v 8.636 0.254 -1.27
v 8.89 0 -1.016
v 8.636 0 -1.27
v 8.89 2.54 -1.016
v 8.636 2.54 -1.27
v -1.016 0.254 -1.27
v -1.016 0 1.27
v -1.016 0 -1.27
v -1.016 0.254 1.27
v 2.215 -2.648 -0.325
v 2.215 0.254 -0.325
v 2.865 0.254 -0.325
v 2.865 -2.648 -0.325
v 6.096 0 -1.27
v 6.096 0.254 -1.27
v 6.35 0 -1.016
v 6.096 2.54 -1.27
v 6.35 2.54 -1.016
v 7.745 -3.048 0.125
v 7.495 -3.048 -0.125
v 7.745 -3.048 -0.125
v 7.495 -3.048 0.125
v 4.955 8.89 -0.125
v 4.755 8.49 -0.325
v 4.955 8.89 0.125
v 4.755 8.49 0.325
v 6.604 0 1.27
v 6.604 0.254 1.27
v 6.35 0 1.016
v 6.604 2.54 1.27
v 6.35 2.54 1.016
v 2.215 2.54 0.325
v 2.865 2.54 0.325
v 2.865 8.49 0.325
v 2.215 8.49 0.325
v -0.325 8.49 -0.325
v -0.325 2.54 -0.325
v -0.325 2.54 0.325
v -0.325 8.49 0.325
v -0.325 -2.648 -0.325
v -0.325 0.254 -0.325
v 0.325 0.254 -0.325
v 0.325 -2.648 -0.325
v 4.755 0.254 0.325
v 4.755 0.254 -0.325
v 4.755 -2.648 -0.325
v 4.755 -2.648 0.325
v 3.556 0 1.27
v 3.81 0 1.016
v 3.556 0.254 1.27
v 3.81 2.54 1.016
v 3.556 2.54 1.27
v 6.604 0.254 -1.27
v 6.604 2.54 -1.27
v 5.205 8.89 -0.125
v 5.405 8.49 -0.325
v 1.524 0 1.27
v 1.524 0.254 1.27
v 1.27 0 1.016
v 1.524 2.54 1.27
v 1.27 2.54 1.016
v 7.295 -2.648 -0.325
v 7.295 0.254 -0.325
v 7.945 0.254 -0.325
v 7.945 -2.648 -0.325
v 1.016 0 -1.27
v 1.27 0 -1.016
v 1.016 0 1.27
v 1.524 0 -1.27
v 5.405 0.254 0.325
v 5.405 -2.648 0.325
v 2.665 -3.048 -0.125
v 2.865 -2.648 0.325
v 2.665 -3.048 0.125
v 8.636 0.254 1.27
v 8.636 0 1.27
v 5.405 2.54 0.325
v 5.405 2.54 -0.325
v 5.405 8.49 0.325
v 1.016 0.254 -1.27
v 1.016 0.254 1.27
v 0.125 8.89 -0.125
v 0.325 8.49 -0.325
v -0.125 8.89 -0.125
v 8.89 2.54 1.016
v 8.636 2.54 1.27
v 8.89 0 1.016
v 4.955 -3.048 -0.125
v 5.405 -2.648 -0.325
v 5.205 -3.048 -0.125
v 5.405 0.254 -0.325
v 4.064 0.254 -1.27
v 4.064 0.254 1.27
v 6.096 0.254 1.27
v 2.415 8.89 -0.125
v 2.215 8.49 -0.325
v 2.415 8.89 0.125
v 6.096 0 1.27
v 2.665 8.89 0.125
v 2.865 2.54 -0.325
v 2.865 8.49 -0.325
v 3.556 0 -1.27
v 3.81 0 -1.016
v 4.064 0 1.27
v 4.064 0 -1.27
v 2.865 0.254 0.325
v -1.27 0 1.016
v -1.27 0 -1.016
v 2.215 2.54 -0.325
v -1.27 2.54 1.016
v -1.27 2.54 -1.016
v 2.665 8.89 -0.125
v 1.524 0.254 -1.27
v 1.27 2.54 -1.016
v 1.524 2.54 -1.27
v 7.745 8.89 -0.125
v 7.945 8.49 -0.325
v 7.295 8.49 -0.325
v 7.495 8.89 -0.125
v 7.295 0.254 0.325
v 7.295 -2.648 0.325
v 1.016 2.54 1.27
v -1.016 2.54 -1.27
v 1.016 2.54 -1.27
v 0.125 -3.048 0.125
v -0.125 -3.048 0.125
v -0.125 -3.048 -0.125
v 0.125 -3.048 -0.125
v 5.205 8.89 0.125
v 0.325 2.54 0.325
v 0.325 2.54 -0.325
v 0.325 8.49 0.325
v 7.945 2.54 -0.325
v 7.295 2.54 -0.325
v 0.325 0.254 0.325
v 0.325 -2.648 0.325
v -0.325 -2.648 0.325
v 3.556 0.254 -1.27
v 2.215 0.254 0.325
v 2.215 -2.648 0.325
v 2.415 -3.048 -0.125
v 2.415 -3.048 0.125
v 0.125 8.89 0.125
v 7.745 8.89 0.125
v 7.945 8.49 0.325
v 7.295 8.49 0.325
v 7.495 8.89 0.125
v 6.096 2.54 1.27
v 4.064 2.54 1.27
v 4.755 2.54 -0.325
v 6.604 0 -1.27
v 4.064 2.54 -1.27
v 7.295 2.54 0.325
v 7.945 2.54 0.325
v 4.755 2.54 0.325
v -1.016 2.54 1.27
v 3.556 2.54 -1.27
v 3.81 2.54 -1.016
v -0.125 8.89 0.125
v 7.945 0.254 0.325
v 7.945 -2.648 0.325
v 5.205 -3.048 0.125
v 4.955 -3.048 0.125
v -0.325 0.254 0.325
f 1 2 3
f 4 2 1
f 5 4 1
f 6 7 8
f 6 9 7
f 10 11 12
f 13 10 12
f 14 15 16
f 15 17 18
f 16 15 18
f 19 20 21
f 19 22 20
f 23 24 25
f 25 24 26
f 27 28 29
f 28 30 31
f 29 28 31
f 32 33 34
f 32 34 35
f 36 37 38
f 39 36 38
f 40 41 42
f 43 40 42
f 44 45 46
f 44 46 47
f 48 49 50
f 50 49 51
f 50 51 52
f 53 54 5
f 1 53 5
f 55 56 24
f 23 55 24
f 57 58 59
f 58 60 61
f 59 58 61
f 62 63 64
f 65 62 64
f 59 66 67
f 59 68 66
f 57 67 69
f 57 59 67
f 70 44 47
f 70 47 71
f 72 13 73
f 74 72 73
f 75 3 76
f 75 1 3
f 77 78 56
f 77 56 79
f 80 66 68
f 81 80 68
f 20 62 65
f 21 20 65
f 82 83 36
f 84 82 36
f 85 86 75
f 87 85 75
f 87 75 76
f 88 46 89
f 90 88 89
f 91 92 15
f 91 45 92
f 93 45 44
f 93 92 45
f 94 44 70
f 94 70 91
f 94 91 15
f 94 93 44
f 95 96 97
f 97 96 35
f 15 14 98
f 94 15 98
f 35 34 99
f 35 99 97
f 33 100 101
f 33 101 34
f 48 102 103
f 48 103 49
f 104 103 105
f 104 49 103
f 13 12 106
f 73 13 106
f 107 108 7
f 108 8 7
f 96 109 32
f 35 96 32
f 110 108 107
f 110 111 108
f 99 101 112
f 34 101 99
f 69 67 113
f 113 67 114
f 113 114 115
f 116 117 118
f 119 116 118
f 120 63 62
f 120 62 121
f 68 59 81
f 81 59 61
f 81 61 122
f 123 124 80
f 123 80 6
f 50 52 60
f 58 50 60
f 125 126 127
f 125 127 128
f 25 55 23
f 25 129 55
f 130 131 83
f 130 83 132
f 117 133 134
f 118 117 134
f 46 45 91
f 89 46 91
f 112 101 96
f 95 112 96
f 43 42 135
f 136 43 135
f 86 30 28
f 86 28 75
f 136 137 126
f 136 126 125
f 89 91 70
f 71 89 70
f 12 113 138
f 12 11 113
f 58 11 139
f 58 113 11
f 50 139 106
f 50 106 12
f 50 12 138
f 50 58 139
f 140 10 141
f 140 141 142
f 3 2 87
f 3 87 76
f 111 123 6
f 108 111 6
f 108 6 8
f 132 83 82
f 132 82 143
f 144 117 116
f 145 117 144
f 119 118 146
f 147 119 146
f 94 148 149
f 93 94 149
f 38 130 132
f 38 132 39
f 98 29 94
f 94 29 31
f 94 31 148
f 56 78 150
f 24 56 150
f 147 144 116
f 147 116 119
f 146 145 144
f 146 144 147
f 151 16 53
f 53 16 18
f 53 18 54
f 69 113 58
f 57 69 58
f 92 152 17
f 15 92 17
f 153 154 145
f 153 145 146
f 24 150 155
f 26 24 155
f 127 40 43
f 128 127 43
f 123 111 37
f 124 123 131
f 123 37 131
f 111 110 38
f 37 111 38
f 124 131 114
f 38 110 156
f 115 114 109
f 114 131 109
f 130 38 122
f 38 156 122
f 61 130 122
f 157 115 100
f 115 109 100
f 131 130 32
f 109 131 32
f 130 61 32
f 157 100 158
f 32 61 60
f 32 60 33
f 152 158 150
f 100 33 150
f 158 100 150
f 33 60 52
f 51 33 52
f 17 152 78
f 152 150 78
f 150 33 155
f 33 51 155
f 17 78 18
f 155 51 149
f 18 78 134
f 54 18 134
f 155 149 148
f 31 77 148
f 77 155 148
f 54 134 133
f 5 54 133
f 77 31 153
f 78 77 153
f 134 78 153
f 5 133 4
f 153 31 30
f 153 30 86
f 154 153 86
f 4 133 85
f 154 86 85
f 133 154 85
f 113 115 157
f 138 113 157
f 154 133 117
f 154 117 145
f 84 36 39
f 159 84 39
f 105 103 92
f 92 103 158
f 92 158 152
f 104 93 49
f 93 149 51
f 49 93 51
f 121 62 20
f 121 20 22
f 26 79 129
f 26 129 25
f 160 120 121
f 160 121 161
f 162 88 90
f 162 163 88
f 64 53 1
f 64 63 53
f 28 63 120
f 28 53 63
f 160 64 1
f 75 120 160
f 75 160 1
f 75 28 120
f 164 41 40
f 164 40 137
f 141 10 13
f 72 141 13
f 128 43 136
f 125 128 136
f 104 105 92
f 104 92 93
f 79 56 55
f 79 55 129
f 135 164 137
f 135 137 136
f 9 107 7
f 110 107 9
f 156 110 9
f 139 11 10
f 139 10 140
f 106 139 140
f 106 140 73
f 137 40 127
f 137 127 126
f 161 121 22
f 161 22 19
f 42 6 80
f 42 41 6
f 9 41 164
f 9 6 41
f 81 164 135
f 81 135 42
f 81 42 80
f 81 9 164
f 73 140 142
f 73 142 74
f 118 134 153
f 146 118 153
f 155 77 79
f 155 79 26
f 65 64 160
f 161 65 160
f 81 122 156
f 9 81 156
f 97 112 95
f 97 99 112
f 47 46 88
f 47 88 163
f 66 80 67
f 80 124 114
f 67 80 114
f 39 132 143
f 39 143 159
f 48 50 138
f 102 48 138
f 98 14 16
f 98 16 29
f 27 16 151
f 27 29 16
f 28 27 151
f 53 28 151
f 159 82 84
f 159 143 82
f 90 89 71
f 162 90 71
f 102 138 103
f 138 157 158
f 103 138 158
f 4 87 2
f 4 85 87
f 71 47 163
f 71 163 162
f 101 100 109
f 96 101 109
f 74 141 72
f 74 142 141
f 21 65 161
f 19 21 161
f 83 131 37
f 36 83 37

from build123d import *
from OCP.BRepFilletAPI import BRepFilletAPI_MakeChamfer

# Parameters (mm, degrees)
CUT_EXTRUDE1_START   = -2.54
CUT_EXTRUDE1_DEPTH   = 2.286
CUT_EXTRUDE1_START_2 = -0.254
CUT_EXTRUDE1_2_DEPTH = 0.254
SKETCH2_W            = 2.032
SKETCH2_H            = 2.54
CUT_EXTRUDE2_DEPTH   = 0.254
CUT_EXTRUDE3_DEPTH   = 0.254
CUT_EXTRUDE4_DEPTH   = 0.254
BOSS_EXTRUDE1_DEPTH  = 0.254
BOSS_EXTRUDE2_DEPTH  = 0.254
SKETCH7_W            = 0.65
SKETCH7_H            = 0.65
BOSS_EXTRUDE3_DEPTH  = 3.302
SKETCH8_W            = 0.65
SKETCH8_H            = 0.65
BOSS_EXTRUDE4_DEPTH  = 3.302
SKETCH9_W            = 0.65
SKETCH9_H            = 0.65
BOSS_EXTRUDE5_DEPTH  = 3.302
SKETCH10_W           = 0.65
SKETCH10_H           = 0.65
BOSS_EXTRUDE6_DEPTH  = 3.302
SKETCH11_W           = 0.65
SKETCH11_H           = 0.65
BOSS_EXTRUDE7_DEPTH  = 6.35
SKETCH12_W           = 0.65
SKETCH12_H           = 0.65
BOSS_EXTRUDE8_DEPTH  = 6.35
SKETCH13_W           = 0.65
SKETCH13_H           = 0.65
BOSS_EXTRUDE9_DEPTH  = 6.35
SKETCH14_W           = 0.65
SKETCH14_H           = 0.65
BOSS_EXTRUDE10_DEPTH = 6.35
CHAMFER1_SIZE        = 0.254
CHAMFER2_SIZE        = 0.2
CHAMFER2_SIZE2       = 0.4


with BuildPart() as part:
    # Cut-Extrude1: read off the stored shape, not the designer's step
    # Cut-Extrude1 outline → Cut-Extrude1 (new body)
    with BuildSketch(Plane.XZ.offset(CUT_EXTRUDE1_START)):
        Polygon((3.556, 1.27), (1.524, 1.27), (1.27, 1.016), (1.016, 1.27), (-1.016, 1.27), (-1.27, 1.016), (-1.27, -1.27), (1.016, -1.27), (1.27, -1.016), (1.524, -1.27), (3.556, -1.27), (3.81, -1.016), (4.064, -1.27), (6.096, -1.27), (6.35, -1.016), (6.604, -1.27), (8.636, -1.27), (8.89, -1.016), (8.89, 1.27), (6.604, 1.27), (6.35, 1.016), (6.096, 1.27), (4.064, 1.27), (3.81, 1.016), align=None)
    extrude(amount=CUT_EXTRUDE1_DEPTH)

    # Cut-Extrude1 2 outline → Cut-Extrude1 2 (add)
    with BuildSketch(Plane.XZ.offset(CUT_EXTRUDE1_START_2)):
        Polygon((1.27, -1.016), (1.524, -1.27), (1.524, 1.27), (1.27, 1.016), (1.016, 1.27), (-1.016, 1.27), (-1.27, 1.016), (-1.27, -1.27), (1.016, -1.27), align=None)
        Polygon((3.556, 1.27), (3.556, -1.27), (3.81, -1.016), (4.064, -1.27), (6.096, -1.27), (6.35, -1.016), (6.604, -1.27), (8.636, -1.27), (8.89, -1.016), (8.89, 1.27), (6.604, 1.27), (6.35, 1.016), (6.096, 1.27), (4.064, 1.27), (3.81, 1.016), align=None)
    extrude(amount=CUT_EXTRUDE1_2_DEPTH)

    # Sketch2 → Cut-Extrude2 (cut)
    with BuildSketch(Plane.XZ):
        with Locations((5.08, 0)):
            Rectangle(SKETCH2_W, SKETCH2_H)
    extrude(amount=-CUT_EXTRUDE2_DEPTH, mode=Mode.SUBTRACT)

    # Sketch3 → Cut-Extrude3 (cut)
    with BuildSketch(Plane.XZ):
        Polygon((-1.27, -1.27), (1.016, -1.27), (1.016, 1.27), (-1.016, 1.27), (-1.27, 1.016), align=None)
    extrude(amount=-CUT_EXTRUDE3_DEPTH, mode=Mode.SUBTRACT)

    # Sketch4 → Cut-Extrude4 (cut)
    with BuildSketch(Plane.XZ):
        Polygon((6.604, -1.27), (8.636, -1.27), (8.89, -1.016), (8.89, 1.27), (6.604, 1.27), align=None)
    extrude(amount=-CUT_EXTRUDE4_DEPTH, mode=Mode.SUBTRACT)

    # Sketch5 → Boss-Extrude1 (add)
    with BuildSketch(Plane.XZ.offset(-0.254)):
        Polygon((-1.27, -1.27), (-1.27, 1.016), (-1.016, 1.27), (-1.016, -1.27), align=None)
    extrude(amount=BOSS_EXTRUDE1_DEPTH)

    # Sketch6 → Boss-Extrude2 (add)
    with BuildSketch(Plane.XZ.offset(-0.254)):
        Polygon((8.89, 1.27), (8.89, -1.016), (8.636, -1.27), (8.636, 1.27), align=None)
    extrude(amount=BOSS_EXTRUDE2_DEPTH)

    # Sketch7 → Boss-Extrude3 (add)
    with BuildSketch(Plane.XZ.offset(-0.254)):
        Rectangle(SKETCH7_W, SKETCH7_H)
    extrude(amount=BOSS_EXTRUDE3_DEPTH)

    # Sketch8 → Boss-Extrude4 (add)
    with BuildSketch(Plane.XZ.offset(-0.254)):
        with Locations((2.54, 0)):
            Rectangle(SKETCH8_W, SKETCH8_H)
    extrude(amount=BOSS_EXTRUDE4_DEPTH)

    # Sketch9 → Boss-Extrude5 (add)
    with BuildSketch(Plane.XZ.offset(-0.254)):
        with Locations((5.08, 0)):
            Rectangle(SKETCH9_W, SKETCH9_H)
    extrude(amount=BOSS_EXTRUDE5_DEPTH)

    # Sketch10 → Boss-Extrude6 (add)
    with BuildSketch(Plane.XZ.offset(-0.254)):
        with Locations((7.62, 0)):
            Rectangle(SKETCH10_W, SKETCH10_H)
    extrude(amount=BOSS_EXTRUDE6_DEPTH)

    # Sketch11 → Boss-Extrude7 (add)
    with BuildSketch(Plane(origin=(0, 2.54, 0), x_dir=(-1, 0, 0), z_dir=(0, 1, 0))):
        Rectangle(SKETCH11_W, SKETCH11_H)
    extrude(amount=BOSS_EXTRUDE7_DEPTH)

    # Sketch12 → Boss-Extrude8 (add)
    with BuildSketch(Plane(origin=(0, 2.54, 0), x_dir=(-1, 0, 0), z_dir=(0, 1, 0))):
        with Locations((-2.54, 0)):
            Rectangle(SKETCH12_W, SKETCH12_H)
    extrude(amount=BOSS_EXTRUDE8_DEPTH)

    # Sketch13 → Boss-Extrude9 (add)
    with BuildSketch(Plane(origin=(0, 2.54, 0), x_dir=(-1, 0, 0), z_dir=(0, 1, 0))):
        with Locations((-5.08, 0)):
            Rectangle(SKETCH13_W, SKETCH13_H)
    extrude(amount=BOSS_EXTRUDE9_DEPTH)

    # Sketch14 → Boss-Extrude10 (add)
    with BuildSketch(Plane(origin=(0, 2.54, 0), x_dir=(-1, 0, 0), z_dir=(0, 1, 0))):
        with Locations((-7.62, 0)):
            Rectangle(SKETCH14_W, SKETCH14_H)
    extrude(amount=BOSS_EXTRUDE10_DEPTH)

    # Chamfer1
    chamfer1_edges = [part.edges().sort_by_distance(p)[0] for p in [
        (-1.27, 1.27, -1.27),
        (8.89, 1.27, 1.27),
    ]]
    chamfer(chamfer1_edges, length=CHAMFER1_SIZE)

    # Chamfer2: one chamfer whose edges measure the first distance from different faces: ONE call of the kernel's chamfer builder (chamfer() names one face for all edges)
    chamfer2_edges_1 = [part.edges().sort_by_distance(p)[0] for p in [
        (-0.325, -3.048, 0),
        (0, -3.048, -0.325),
        (0.325, -3.048, 0),
        (0, -3.048, 0.325),
    ]]
    chamfer2_side_1 = [part.faces().sort_by_distance(p)[0] for p in [
        (0, -3.048, 0),
    ]]
    chamfer2_edges_2 = [part.edges().sort_by_distance(p)[0] for p in [
        (2.54, -3.048, -0.325),
        (2.865, -3.048, 0),
        (2.54, -3.048, 0.325),
        (2.215, -3.048, 0),
    ]]
    chamfer2_side_2 = [part.faces().sort_by_distance(p)[0] for p in [
        (2.54, -3.048, 0),
    ]]
    chamfer2_edges_3 = [part.edges().sort_by_distance(p)[0] for p in [
        (5.08, -3.048, -0.325),
        (5.405, -3.048, 0),
        (5.08, -3.048, 0.325),
        (4.755, -3.048, 0),
    ]]
    chamfer2_side_3 = [part.faces().sort_by_distance(p)[0] for p in [
        (5.08, -3.048, 0),
    ]]
    chamfer2_edges_4 = [part.edges().sort_by_distance(p)[0] for p in [
        (7.62, -3.048, -0.325),
        (7.945, -3.048, 0),
        (7.62, -3.048, 0.325),
        (7.295, -3.048, 0),
    ]]
    chamfer2_side_4 = [part.faces().sort_by_distance(p)[0] for p in [
        (7.62, -3.048, 0),
    ]]
    chamfer2_edges_5 = [part.edges().sort_by_distance(p)[0] for p in [
        (0, 8.89, -0.325),
        (-0.325, 8.89, 0),
        (0, 8.89, 0.325),
        (0.325, 8.89, 0),
    ]]
    chamfer2_side_5 = [part.faces().sort_by_distance(p)[0] for p in [
        (0, 8.89, 0),
    ]]
    chamfer2_edges_6 = [part.edges().sort_by_distance(p)[0] for p in [
        (2.54, 8.89, -0.325),
        (2.215, 8.89, 0),
        (2.54, 8.89, 0.325),
        (2.865, 8.89, 0),
    ]]
    chamfer2_side_6 = [part.faces().sort_by_distance(p)[0] for p in [
        (2.54, 8.89, 0),
    ]]
    chamfer2_edges_7 = [part.edges().sort_by_distance(p)[0] for p in [
        (5.08, 8.89, -0.325),
        (4.755, 8.89, 0),
        (5.08, 8.89, 0.325),
        (5.405, 8.89, 0),
    ]]
    chamfer2_side_7 = [part.faces().sort_by_distance(p)[0] for p in [
        (5.08, 8.89, 0),
    ]]
    chamfer2_edges_8 = [part.edges().sort_by_distance(p)[0] for p in [
        (7.945, 8.89, 0),
        (7.62, 8.89, -0.325),
        (7.295, 8.89, 0),
        (7.62, 8.89, 0.325),
    ]]
    chamfer2_side_8 = [part.faces().sort_by_distance(p)[0] for p in [
        (7.62, 8.89, 0),
    ]]
    chamfer2 = BRepFilletAPI_MakeChamfer(part.part.solid().wrapped)
    for e in chamfer2_edges_1:
        chamfer2.Add(CHAMFER2_SIZE, CHAMFER2_SIZE2, e.wrapped, chamfer2_side_1[0].wrapped)  # the first distance lies on this face
    for e in chamfer2_edges_2:
        chamfer2.Add(CHAMFER2_SIZE, CHAMFER2_SIZE2, e.wrapped, chamfer2_side_2[0].wrapped)  # the first distance lies on this face
    for e in chamfer2_edges_3:
        chamfer2.Add(CHAMFER2_SIZE, CHAMFER2_SIZE2, e.wrapped, chamfer2_side_3[0].wrapped)  # the first distance lies on this face
    for e in chamfer2_edges_4:
        chamfer2.Add(CHAMFER2_SIZE, CHAMFER2_SIZE2, e.wrapped, chamfer2_side_4[0].wrapped)  # the first distance lies on this face
    for e in chamfer2_edges_5:
        chamfer2.Add(CHAMFER2_SIZE, CHAMFER2_SIZE2, e.wrapped, chamfer2_side_5[0].wrapped)  # the first distance lies on this face
    for e in chamfer2_edges_6:
        chamfer2.Add(CHAMFER2_SIZE, CHAMFER2_SIZE2, e.wrapped, chamfer2_side_6[0].wrapped)  # the first distance lies on this face
    for e in chamfer2_edges_7:
        chamfer2.Add(CHAMFER2_SIZE, CHAMFER2_SIZE2, e.wrapped, chamfer2_side_7[0].wrapped)  # the first distance lies on this face
    for e in chamfer2_edges_8:
        chamfer2.Add(CHAMFER2_SIZE, CHAMFER2_SIZE2, e.wrapped, chamfer2_side_8[0].wrapped)  # the first distance lies on this face
    add(Compound.cast(chamfer2.Shape()), mode=Mode.REPLACE)


solid = part.part
